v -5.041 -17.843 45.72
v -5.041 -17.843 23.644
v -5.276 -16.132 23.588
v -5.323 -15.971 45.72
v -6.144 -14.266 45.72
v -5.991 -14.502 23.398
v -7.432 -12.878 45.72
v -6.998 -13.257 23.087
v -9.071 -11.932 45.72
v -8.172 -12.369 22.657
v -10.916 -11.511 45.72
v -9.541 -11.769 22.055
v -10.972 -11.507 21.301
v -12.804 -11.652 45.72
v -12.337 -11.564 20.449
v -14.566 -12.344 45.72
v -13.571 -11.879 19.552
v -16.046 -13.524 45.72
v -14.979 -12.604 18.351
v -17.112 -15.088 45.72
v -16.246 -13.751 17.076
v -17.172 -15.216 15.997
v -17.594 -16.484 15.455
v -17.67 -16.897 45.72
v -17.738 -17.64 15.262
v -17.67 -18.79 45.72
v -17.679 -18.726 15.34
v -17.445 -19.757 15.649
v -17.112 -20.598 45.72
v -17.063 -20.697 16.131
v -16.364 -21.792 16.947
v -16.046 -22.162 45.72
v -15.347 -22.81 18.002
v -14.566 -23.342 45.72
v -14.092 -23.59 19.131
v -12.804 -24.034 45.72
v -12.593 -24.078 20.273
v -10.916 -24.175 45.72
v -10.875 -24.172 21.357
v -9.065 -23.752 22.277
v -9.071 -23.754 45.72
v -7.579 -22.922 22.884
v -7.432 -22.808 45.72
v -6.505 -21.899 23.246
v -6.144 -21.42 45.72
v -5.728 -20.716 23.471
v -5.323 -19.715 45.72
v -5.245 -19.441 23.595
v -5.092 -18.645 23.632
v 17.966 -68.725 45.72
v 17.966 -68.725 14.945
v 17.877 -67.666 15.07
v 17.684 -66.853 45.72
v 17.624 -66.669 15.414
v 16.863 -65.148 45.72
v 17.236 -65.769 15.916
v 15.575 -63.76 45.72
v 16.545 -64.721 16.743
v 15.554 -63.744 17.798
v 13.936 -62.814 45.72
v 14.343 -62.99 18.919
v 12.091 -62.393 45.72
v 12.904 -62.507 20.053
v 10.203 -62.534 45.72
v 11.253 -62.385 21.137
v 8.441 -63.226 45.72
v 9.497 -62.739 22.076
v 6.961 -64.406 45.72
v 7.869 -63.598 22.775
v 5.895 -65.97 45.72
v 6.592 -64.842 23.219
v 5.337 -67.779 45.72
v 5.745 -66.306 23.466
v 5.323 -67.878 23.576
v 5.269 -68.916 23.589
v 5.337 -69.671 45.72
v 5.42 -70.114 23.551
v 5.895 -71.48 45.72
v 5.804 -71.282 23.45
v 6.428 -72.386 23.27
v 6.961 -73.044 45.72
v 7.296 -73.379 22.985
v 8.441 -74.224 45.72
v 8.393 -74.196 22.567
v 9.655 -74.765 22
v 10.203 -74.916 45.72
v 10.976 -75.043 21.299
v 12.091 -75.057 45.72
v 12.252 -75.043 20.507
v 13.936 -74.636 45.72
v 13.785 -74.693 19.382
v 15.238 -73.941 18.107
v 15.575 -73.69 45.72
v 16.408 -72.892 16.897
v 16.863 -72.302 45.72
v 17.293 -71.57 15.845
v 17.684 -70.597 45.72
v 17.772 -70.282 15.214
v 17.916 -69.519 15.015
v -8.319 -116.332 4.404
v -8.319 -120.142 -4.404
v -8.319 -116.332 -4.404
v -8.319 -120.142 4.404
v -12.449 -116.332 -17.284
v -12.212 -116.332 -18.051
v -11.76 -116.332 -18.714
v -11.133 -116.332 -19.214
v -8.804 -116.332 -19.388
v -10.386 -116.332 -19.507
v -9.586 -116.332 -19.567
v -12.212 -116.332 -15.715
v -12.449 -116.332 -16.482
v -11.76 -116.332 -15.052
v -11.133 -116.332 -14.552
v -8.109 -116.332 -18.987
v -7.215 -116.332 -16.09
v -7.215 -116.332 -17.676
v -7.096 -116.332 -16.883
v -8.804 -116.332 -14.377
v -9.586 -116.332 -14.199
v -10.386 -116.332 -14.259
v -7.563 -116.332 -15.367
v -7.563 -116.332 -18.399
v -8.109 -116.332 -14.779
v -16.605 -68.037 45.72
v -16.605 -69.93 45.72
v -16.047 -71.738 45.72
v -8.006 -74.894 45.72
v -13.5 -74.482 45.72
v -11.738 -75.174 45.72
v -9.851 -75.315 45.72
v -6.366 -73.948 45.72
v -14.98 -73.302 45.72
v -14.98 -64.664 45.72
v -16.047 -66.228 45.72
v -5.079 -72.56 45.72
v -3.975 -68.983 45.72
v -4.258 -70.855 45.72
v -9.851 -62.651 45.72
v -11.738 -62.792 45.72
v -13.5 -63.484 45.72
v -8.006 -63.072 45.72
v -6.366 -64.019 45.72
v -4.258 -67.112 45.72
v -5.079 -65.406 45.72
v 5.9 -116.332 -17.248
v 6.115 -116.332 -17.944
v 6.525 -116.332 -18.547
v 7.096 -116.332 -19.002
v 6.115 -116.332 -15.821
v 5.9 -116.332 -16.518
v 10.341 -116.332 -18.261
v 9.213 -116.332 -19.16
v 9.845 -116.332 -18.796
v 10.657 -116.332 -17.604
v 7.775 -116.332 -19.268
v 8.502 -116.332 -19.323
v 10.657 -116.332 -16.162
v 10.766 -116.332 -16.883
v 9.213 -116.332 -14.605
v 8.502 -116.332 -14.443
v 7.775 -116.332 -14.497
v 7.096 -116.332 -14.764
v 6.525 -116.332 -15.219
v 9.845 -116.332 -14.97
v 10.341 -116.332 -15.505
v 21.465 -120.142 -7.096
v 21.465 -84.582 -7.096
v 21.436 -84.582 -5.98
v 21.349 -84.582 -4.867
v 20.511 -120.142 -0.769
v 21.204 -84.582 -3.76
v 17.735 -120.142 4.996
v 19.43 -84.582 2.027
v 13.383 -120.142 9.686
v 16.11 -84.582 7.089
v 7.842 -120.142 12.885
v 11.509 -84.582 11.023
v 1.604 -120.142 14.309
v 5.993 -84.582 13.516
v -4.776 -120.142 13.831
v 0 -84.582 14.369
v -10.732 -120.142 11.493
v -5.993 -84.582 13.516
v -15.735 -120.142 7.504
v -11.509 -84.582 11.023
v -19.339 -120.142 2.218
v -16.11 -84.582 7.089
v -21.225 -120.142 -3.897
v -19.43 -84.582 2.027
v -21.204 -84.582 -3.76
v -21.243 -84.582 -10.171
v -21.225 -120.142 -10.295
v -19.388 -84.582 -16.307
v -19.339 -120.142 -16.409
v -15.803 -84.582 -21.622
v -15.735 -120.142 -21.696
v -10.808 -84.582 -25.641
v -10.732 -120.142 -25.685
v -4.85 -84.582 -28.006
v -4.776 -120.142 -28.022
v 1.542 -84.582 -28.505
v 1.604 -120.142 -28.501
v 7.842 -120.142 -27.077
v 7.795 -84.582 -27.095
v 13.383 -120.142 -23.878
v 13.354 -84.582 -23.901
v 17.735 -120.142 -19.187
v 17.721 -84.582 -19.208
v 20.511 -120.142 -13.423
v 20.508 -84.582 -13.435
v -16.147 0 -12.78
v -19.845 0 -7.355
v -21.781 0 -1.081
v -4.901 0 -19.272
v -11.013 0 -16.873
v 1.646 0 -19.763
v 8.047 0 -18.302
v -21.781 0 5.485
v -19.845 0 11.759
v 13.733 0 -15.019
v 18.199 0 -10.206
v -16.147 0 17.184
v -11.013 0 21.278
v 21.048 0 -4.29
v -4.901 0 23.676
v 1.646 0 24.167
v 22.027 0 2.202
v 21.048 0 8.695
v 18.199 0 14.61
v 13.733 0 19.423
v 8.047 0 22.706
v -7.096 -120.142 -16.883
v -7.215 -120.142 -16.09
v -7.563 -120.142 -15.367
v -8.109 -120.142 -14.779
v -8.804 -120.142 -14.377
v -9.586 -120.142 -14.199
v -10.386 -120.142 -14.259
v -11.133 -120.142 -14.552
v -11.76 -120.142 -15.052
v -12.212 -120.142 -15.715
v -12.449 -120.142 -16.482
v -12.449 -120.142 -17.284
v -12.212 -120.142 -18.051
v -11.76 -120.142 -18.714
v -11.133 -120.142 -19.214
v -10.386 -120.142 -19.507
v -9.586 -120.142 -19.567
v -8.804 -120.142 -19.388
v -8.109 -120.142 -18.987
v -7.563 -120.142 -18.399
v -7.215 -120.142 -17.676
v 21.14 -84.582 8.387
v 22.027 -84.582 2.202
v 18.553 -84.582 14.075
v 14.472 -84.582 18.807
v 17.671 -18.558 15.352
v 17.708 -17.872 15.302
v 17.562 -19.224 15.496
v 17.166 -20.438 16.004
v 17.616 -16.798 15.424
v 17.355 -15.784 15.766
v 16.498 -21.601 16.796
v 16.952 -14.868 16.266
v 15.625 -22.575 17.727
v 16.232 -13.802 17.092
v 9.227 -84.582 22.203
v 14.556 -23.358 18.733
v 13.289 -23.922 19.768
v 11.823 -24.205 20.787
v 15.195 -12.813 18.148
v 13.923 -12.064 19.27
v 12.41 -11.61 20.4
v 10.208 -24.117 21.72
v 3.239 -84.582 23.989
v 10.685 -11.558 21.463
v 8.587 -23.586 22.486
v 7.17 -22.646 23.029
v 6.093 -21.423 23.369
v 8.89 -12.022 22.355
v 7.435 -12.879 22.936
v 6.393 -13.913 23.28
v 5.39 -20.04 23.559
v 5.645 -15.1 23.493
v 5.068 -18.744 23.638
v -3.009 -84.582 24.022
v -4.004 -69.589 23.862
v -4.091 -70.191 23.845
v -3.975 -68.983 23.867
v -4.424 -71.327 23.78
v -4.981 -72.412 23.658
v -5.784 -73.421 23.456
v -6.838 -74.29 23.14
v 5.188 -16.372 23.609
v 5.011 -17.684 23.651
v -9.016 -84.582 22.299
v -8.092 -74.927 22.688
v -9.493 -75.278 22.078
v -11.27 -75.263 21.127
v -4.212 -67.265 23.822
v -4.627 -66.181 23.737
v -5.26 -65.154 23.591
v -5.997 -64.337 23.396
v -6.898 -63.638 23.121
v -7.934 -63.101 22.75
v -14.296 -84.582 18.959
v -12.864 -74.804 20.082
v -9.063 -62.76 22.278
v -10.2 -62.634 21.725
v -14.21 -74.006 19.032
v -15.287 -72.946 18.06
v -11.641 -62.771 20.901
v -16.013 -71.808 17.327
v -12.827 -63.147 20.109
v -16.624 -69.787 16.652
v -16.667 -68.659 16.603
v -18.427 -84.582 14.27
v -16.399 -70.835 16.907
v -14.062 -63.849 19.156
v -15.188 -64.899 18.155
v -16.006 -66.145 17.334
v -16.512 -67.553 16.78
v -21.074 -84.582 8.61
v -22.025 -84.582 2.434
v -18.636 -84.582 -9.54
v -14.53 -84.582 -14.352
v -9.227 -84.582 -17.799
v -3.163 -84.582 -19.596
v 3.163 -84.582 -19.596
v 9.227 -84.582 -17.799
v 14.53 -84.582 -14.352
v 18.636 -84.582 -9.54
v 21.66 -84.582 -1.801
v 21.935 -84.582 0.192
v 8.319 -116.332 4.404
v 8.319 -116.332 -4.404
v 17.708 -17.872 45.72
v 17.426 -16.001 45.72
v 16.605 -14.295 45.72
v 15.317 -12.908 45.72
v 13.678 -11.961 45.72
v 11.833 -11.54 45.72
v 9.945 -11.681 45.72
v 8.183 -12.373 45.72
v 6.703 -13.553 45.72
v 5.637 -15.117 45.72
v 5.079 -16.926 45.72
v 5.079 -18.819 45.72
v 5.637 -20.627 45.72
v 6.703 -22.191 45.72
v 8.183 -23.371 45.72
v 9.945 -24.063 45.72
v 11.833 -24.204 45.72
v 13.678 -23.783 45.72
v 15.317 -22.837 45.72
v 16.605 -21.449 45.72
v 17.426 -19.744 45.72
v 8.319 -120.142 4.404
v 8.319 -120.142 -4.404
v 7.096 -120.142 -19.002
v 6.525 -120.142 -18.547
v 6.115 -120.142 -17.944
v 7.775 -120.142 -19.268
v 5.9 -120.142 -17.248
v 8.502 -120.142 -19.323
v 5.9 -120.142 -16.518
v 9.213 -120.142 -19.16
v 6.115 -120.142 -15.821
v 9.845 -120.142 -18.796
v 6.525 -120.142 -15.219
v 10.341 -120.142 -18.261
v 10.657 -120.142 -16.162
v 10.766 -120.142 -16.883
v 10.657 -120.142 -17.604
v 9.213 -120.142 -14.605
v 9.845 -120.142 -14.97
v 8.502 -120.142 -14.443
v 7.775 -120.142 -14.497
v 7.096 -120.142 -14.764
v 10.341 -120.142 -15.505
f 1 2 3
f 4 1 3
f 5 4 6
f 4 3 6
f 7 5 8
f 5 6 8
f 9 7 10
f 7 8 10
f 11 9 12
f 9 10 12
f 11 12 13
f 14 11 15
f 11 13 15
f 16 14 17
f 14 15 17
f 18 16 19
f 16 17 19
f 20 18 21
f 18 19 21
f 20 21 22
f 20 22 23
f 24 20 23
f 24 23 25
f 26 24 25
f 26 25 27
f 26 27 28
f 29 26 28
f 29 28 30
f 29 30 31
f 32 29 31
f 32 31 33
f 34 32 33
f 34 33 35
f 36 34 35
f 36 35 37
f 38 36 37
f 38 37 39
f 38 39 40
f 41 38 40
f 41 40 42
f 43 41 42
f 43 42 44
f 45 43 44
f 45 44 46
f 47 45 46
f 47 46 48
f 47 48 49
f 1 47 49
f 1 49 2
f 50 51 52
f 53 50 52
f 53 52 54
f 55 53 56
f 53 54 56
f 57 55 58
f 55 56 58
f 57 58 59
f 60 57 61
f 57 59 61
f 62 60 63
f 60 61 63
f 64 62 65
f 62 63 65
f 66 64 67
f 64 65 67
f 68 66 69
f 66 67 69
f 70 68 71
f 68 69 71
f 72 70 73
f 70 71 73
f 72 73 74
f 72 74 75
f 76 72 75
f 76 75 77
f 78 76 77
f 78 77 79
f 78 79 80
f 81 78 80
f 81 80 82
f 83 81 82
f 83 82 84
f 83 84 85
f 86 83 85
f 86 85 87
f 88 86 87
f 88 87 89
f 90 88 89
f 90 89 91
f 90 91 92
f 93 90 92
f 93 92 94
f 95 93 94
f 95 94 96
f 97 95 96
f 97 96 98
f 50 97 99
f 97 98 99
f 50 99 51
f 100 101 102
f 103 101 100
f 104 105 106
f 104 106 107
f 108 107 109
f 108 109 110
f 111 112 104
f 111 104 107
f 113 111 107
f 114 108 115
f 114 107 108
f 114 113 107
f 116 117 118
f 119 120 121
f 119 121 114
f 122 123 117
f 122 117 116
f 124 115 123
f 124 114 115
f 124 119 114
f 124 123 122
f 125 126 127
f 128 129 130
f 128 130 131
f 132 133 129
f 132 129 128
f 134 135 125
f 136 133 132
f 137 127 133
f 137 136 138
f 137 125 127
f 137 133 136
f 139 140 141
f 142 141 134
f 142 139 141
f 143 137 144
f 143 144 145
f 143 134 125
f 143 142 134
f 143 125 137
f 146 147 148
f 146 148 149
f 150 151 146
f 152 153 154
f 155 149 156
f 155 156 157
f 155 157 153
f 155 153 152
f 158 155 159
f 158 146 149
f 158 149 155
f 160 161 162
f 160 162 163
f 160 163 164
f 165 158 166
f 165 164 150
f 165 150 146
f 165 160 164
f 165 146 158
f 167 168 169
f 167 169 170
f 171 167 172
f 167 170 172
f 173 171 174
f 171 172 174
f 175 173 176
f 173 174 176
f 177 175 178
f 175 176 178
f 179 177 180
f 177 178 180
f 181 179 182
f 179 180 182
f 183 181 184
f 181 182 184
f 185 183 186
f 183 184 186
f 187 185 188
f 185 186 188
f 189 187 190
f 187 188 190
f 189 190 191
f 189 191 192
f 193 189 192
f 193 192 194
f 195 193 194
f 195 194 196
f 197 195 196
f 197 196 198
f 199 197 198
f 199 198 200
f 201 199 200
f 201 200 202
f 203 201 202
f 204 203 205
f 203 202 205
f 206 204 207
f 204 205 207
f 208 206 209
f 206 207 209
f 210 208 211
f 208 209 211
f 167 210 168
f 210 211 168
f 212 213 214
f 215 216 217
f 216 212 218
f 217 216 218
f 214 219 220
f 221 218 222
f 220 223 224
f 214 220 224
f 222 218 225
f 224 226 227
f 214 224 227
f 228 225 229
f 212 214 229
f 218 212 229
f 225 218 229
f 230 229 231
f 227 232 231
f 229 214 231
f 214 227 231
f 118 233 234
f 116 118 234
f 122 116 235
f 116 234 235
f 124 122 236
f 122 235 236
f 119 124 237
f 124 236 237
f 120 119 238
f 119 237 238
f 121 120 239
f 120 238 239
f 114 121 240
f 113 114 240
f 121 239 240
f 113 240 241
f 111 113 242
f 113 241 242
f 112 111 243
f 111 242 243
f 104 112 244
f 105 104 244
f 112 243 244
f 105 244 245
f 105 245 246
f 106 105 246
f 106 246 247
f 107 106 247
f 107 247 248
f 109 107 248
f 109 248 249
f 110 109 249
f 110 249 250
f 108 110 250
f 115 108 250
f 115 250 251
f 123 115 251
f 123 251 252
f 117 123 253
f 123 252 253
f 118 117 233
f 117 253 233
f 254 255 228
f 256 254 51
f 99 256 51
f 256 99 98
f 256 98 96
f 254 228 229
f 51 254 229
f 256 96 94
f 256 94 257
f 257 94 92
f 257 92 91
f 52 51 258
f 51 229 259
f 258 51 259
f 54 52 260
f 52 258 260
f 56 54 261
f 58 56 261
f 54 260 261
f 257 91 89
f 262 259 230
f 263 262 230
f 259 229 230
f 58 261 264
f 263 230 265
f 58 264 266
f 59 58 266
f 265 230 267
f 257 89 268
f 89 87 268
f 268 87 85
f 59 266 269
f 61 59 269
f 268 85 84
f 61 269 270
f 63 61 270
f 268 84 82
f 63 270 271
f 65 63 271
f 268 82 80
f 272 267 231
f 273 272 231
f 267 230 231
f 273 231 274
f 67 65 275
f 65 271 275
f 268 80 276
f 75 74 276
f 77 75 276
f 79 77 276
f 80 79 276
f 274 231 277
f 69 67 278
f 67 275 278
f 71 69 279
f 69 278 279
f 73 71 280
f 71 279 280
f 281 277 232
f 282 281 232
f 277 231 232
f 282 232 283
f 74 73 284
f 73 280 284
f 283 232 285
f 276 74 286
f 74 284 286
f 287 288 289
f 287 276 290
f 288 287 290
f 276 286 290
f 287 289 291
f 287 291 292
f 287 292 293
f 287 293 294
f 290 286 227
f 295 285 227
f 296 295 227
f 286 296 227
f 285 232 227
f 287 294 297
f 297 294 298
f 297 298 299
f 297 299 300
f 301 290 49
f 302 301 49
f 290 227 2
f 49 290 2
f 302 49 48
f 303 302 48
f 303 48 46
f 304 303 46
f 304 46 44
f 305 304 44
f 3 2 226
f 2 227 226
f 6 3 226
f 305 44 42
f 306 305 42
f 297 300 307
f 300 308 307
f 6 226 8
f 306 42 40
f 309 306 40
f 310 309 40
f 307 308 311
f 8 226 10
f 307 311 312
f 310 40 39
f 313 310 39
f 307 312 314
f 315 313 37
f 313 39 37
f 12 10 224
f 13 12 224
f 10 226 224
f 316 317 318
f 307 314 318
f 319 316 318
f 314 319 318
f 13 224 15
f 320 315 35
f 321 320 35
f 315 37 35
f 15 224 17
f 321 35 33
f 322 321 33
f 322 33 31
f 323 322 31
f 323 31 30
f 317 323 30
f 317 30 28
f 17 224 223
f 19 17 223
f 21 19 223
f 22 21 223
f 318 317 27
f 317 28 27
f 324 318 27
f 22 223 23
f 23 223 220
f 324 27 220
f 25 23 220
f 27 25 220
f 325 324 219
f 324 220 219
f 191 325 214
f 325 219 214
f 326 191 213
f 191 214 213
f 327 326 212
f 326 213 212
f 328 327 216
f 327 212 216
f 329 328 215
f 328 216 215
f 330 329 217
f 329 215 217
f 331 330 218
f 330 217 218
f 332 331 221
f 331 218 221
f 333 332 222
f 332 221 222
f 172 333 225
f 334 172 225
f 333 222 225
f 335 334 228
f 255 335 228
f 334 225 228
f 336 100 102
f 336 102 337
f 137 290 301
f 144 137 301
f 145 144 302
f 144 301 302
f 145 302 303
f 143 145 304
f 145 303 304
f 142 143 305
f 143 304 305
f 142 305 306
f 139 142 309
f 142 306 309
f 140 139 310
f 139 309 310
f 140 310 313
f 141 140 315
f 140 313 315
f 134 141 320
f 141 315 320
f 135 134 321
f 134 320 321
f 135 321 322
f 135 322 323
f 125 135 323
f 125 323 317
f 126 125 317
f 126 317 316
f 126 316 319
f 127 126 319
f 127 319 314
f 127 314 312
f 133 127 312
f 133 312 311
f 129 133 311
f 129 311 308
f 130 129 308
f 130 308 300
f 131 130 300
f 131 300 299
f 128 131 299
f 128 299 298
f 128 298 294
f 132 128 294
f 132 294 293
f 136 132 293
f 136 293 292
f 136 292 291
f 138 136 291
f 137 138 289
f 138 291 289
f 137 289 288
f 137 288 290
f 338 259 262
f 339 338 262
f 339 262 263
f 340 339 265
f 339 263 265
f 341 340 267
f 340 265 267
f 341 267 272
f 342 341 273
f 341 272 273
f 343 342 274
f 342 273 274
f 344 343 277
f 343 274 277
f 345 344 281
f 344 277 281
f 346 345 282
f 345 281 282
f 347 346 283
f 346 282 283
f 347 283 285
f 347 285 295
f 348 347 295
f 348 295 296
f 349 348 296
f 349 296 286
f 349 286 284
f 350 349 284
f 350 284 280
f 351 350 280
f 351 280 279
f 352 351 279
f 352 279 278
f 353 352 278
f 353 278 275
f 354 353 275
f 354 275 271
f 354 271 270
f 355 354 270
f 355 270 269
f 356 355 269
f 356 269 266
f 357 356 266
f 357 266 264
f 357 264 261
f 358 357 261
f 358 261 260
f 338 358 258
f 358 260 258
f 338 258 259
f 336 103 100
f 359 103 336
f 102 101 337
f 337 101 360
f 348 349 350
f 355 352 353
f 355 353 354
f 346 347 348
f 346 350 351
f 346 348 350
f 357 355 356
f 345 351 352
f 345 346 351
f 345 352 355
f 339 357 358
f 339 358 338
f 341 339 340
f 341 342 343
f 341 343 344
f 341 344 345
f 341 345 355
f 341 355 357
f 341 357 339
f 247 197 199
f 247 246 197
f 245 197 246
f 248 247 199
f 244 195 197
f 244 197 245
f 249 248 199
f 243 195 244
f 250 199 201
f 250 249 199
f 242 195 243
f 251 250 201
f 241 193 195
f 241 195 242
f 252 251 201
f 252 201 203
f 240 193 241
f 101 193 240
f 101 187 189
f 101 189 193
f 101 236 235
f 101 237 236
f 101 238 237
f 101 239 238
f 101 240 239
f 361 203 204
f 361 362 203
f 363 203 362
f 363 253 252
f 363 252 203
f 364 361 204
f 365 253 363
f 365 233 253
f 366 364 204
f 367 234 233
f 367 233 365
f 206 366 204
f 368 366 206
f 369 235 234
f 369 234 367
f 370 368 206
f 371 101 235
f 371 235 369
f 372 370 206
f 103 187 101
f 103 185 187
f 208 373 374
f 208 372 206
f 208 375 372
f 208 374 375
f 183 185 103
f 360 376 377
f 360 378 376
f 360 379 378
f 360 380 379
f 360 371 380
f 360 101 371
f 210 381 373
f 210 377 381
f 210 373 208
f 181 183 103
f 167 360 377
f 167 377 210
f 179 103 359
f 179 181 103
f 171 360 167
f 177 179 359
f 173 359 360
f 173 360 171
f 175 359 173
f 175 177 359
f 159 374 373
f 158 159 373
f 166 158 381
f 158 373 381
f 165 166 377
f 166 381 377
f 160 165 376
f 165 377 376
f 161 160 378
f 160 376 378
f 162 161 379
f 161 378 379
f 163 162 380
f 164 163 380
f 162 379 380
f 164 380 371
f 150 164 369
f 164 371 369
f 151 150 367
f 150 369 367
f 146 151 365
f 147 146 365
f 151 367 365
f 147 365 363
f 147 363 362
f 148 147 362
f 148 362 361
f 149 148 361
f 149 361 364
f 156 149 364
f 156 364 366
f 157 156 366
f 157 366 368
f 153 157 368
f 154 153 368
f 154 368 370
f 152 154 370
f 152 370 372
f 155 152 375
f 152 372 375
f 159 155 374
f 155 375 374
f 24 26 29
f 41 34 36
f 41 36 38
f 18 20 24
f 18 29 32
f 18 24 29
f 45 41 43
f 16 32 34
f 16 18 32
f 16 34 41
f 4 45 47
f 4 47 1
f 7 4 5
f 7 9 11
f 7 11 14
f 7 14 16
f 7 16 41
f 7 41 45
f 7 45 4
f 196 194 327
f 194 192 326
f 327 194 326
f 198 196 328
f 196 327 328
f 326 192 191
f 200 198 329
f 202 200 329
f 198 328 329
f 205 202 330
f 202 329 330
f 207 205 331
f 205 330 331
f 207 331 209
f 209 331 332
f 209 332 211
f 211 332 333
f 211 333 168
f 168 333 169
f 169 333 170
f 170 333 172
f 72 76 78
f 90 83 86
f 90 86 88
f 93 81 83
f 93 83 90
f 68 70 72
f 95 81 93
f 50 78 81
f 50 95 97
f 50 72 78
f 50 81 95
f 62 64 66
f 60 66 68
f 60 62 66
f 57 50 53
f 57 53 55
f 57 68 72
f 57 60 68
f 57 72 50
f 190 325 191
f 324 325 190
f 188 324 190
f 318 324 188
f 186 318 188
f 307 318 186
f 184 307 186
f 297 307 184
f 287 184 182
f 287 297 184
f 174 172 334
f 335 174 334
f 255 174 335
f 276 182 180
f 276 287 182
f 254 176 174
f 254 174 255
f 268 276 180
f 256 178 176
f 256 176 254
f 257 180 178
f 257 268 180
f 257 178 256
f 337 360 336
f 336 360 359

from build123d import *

# Parameters (mm, degrees)
F0_R     = 22.026537
F1_DEPTH = 84.582
F2_R     = 6.35
F3_DEPTH = 45.72
F4_R     = 21.464909
F5_DEPTH = 35.56
F6_R     = 2.691467
F6_R_2   = 2.446789
F6_W     = 16.638168
F6_H     = 8.80844
F7_DEPTH = 3.81


with BuildPart() as f1:
    # F0 (on Front) → F1 (new body)
    with BuildSketch(Plane.XZ):
        with Locations((0, 2.20211)):
            Circle(F0_R)
    extrude(amount=F1_DEPTH)

    # F2 (on Top) → F3 (join)
    with BuildSketch(Plane.XY):
        with Locations((-11.390769, -17.843104)):
            Circle(F2_R)
        with Locations((11.357995, -17.872222)):
            Circle(F2_R)
        with Locations((-10.32545, -68.983197)):
            Circle(F2_R)
        with Locations((11.616129, -68.725064)):
            Circle(F2_R)
    extrude(amount=F3_DEPTH)

    # F4 (on face) → F5 (join)
    with BuildSketch(Plane.XZ.offset(84.582)):
        with Locations((0, -7.095688)):
            Circle(F4_R)
    extrude(amount=F5_DEPTH)

    # F6 (on face) → F7 (cut)
    with BuildSketch(Plane.XZ.offset(120.142)):
        with Locations((-9.787156, -16.882844)):
            Circle(F6_R)
        with Locations((8.319084, -16.882844)):
            Circle(F6_R_2)
        Rectangle(F6_W, F6_H)
    extrude(amount=-F7_DEPTH, mode=Mode.SUBTRACT)


solid = f1.part
